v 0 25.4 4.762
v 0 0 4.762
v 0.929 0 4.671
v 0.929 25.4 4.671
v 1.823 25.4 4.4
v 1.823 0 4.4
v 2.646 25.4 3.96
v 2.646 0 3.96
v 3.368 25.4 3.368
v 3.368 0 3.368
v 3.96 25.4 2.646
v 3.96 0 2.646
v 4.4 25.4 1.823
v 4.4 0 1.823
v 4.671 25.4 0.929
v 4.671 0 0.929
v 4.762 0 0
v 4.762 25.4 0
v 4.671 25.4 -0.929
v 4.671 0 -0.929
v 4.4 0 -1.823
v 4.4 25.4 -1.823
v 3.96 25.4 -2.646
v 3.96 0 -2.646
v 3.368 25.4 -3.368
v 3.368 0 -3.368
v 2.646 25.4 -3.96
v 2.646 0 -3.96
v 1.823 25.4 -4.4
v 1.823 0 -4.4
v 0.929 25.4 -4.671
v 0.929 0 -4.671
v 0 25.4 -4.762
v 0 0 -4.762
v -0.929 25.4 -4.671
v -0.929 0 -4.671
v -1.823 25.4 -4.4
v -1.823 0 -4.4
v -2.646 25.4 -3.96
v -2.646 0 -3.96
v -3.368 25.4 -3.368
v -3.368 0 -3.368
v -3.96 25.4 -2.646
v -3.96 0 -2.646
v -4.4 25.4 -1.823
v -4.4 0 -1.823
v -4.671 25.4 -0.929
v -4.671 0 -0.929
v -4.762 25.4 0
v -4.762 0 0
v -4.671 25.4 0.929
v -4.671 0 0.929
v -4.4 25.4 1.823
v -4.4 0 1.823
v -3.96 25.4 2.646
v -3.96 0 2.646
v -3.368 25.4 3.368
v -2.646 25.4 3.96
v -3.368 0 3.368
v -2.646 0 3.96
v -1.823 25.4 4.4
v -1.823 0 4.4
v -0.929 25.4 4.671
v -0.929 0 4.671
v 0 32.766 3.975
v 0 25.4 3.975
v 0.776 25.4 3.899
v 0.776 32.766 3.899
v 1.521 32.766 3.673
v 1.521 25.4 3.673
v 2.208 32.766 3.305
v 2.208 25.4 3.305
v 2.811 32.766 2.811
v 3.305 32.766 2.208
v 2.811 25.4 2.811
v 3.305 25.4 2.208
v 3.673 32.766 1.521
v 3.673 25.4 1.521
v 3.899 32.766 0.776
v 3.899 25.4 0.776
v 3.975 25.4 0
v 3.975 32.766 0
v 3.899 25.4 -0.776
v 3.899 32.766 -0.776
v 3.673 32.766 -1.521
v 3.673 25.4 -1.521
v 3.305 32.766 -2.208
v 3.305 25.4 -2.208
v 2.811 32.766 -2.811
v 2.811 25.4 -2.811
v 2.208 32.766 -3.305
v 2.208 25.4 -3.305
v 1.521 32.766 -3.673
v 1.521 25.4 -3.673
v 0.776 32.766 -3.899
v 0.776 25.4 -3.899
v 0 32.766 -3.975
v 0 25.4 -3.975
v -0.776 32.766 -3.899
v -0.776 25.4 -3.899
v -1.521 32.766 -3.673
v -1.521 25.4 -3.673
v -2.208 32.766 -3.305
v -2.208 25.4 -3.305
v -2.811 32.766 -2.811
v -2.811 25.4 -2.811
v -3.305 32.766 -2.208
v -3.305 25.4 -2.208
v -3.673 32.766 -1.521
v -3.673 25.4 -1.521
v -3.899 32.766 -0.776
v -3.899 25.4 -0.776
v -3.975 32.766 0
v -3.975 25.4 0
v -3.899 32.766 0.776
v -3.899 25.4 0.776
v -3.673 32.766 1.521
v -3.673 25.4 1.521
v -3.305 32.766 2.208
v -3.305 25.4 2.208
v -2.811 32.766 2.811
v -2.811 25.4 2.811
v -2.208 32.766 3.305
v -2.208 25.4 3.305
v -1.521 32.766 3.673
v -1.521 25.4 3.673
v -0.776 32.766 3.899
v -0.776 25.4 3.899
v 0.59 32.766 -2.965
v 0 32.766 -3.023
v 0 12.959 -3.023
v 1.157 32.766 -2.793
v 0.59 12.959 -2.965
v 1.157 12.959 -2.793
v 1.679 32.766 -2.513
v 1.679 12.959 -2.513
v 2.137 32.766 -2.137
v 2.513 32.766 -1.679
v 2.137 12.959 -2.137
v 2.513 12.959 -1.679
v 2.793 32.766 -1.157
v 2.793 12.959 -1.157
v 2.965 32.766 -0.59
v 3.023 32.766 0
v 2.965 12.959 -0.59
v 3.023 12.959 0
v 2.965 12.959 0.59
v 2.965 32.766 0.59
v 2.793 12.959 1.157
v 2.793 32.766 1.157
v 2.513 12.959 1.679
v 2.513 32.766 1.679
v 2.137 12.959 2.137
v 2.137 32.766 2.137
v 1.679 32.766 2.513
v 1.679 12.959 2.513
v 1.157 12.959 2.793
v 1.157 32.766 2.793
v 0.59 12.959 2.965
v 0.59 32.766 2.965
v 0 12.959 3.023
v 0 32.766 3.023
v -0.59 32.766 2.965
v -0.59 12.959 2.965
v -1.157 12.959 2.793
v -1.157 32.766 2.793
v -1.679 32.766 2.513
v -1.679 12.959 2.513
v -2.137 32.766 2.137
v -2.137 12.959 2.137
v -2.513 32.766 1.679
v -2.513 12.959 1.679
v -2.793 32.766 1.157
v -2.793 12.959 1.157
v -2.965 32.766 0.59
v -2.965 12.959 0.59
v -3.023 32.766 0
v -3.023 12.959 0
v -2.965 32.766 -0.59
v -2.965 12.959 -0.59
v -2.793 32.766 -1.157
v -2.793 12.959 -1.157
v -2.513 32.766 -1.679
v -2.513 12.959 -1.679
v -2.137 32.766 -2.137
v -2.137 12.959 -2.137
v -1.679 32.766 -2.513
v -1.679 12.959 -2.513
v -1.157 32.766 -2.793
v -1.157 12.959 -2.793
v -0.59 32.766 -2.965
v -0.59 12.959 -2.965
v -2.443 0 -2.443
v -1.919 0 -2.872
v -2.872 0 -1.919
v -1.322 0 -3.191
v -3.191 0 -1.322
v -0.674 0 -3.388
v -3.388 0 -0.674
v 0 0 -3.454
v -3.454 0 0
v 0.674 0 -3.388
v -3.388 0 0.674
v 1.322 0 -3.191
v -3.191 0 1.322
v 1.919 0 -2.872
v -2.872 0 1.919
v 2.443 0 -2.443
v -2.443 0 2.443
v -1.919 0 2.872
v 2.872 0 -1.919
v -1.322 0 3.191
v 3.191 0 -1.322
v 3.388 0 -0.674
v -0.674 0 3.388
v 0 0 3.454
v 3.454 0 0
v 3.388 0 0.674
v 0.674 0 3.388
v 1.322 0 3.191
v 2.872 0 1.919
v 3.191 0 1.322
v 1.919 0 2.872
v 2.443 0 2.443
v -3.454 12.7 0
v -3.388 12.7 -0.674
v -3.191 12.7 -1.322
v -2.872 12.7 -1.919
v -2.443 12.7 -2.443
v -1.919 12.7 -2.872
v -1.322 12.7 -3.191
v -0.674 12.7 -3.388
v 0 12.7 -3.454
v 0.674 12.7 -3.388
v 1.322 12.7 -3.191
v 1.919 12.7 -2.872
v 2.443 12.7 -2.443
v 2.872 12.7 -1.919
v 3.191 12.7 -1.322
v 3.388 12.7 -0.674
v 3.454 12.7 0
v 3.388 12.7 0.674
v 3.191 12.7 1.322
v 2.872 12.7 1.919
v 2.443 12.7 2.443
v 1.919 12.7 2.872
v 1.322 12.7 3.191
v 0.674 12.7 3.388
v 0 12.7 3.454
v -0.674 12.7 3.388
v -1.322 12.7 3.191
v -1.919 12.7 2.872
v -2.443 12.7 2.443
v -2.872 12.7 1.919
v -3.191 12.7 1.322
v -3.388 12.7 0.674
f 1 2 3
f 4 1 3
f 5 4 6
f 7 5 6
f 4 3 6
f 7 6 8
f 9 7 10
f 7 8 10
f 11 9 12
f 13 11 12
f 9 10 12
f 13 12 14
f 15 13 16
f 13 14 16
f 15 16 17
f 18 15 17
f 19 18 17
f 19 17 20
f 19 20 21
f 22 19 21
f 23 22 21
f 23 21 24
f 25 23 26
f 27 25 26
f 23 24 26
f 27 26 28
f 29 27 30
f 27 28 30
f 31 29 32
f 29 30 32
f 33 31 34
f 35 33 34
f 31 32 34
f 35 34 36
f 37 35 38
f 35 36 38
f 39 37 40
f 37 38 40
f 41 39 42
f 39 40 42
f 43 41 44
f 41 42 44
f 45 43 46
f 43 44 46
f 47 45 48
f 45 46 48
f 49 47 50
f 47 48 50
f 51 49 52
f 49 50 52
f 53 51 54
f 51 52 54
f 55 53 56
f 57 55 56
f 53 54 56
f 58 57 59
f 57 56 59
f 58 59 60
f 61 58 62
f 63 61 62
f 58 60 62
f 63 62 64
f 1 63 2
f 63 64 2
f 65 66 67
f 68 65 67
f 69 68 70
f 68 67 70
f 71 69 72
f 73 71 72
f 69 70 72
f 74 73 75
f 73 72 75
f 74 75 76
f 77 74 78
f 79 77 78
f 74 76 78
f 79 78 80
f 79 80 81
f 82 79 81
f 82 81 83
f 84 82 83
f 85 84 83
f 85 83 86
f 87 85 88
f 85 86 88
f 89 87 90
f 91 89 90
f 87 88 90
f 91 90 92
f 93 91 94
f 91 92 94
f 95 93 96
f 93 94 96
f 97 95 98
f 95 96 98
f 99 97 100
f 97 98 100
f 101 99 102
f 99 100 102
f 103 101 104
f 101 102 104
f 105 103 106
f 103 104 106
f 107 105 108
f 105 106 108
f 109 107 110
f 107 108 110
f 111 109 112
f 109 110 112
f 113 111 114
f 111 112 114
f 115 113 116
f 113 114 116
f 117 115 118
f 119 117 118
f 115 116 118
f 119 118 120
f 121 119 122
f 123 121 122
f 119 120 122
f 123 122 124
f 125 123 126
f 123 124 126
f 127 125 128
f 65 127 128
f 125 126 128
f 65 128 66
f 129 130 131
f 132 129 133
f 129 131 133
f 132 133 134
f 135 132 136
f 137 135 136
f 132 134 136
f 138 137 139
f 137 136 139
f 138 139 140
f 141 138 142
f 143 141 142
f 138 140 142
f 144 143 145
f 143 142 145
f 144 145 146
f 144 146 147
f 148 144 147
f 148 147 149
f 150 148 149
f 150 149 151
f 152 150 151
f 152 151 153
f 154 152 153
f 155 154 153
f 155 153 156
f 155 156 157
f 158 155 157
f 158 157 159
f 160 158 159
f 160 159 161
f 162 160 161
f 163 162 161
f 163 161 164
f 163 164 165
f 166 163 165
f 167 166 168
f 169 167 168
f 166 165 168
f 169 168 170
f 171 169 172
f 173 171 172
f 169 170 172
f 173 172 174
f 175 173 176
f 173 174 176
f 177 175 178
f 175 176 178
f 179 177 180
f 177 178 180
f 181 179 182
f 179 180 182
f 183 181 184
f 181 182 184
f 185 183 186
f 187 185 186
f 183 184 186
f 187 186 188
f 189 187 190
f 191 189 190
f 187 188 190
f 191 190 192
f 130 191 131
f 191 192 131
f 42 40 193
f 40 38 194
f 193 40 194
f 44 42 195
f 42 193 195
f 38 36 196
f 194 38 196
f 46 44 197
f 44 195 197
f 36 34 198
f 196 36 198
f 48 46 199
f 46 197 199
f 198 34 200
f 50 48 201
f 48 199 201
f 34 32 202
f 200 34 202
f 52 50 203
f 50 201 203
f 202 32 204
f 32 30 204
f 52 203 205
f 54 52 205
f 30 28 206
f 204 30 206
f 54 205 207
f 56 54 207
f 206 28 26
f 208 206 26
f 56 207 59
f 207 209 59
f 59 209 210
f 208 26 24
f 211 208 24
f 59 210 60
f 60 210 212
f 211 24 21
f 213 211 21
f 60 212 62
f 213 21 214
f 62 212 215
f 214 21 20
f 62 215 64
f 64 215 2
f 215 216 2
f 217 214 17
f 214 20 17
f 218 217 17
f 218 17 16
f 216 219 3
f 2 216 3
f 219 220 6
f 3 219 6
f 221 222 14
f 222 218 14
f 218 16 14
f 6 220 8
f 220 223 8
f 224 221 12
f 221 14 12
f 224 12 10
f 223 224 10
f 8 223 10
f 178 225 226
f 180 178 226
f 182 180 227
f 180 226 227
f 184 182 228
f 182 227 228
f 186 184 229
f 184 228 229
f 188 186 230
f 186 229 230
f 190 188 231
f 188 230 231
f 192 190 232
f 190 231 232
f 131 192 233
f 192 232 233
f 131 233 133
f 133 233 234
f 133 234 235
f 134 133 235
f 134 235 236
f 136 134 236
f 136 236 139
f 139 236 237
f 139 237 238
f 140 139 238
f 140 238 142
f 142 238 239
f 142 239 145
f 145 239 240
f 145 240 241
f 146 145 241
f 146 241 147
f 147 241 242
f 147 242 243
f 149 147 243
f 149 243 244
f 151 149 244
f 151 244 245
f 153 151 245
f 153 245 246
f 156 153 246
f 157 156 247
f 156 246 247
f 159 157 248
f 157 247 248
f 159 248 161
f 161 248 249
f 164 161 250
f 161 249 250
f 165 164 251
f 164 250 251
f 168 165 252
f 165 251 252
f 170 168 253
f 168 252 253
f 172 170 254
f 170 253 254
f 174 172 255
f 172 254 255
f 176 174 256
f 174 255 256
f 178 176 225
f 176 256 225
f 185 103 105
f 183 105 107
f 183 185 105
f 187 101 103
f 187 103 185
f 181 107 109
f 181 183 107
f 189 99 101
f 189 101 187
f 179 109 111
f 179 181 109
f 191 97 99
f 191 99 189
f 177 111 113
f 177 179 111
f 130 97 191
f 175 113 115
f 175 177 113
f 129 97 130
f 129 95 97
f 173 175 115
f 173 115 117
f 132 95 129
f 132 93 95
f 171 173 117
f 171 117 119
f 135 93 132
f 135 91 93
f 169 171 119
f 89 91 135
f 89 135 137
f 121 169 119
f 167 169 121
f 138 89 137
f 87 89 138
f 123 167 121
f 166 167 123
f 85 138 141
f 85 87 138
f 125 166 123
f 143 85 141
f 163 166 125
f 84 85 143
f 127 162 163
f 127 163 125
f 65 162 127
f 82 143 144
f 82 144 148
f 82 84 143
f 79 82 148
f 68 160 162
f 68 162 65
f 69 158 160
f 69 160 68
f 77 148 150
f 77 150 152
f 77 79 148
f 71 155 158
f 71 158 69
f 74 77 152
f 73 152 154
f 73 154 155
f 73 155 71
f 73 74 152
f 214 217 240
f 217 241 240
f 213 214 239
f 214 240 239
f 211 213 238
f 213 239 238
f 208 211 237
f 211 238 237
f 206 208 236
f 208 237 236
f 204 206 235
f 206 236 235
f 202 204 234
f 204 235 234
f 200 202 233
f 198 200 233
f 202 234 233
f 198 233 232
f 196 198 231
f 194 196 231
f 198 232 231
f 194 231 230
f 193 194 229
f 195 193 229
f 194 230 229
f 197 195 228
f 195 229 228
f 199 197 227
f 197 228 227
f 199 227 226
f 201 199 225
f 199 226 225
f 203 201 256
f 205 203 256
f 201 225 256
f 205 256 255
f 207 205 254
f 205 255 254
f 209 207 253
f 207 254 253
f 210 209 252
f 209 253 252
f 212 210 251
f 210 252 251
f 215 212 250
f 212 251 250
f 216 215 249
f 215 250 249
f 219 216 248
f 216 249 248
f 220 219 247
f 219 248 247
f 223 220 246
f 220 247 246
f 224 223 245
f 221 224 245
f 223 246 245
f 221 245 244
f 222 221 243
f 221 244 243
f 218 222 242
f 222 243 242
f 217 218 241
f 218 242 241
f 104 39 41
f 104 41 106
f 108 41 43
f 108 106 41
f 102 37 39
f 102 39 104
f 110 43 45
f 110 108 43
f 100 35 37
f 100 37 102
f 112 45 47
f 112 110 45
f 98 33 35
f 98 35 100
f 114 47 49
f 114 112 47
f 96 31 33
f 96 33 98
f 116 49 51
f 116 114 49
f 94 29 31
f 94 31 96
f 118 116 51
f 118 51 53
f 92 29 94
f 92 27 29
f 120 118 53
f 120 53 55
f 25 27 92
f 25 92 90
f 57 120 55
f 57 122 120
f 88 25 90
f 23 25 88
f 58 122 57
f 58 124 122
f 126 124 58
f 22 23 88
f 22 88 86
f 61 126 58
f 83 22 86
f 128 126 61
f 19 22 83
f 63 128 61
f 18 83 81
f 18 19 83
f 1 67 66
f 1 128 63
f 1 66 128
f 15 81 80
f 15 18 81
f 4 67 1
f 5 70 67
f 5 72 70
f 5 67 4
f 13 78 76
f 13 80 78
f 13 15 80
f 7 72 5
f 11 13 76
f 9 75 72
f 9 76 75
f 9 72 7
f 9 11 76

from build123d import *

# Parameters (mm, degrees)
SKETCH1_R                    = 4.7625
BOSS_EXTRUDE1_DEPTH          = 25.4
SKETCH2_R                    = 3.9751
BOSS_EXTRUDE2_DEPTH          = 7.366
SKETCH3_R                    = 3.0226
CUT_EXTRUDE1_DEPTH           = 33.766
F_5_16_24_TAPPED_HOLE1_D     = 6.9088
F_5_16_24_TAPPED_HOLE1_DEPTH = 12.7
F_5_16_24_TAPPED_HOLE1_TIP   = 2.075612922


with BuildPart() as part:
    # Sketch1 → Boss-Extrude1 (new body)
    with BuildSketch(Plane(origin=(0, 0, 0), x_dir=(1, 0, 0), z_dir=(0, 1, 0))):
        with Locations(Location((0, 0, 0), (0, 0, 270))):  # turned: the seam where the file's is
            Circle(SKETCH1_R)
    extrude(amount=BOSS_EXTRUDE1_DEPTH)

    # Sketch2 → Boss-Extrude2 (add)
    with BuildSketch(Plane(origin=(0, 25.4, 0), x_dir=(1, 0, 0), z_dir=(0, 1, 0))):
        with Locations(Location((0, 0, 0), (0, 0, 270))):  # turned: the seam where the file's is
            Circle(SKETCH2_R)
    extrude(amount=BOSS_EXTRUDE2_DEPTH)

    # Sketch3 → Cut-Extrude1 (cut, through all)
    with BuildSketch(Plane.XZ):
        with Locations(Location((0, 0, 0), (0, 0, 270))):  # turned: the seam where the file's is
            Circle(SKETCH3_R)
    extrude(amount=-CUT_EXTRUDE1_DEPTH, mode=Mode.SUBTRACT)

    # 5/16-24 Tapped Hole1
    with Locations(Plane(origin=(0, 0, 0), x_dir=(-1, 0, 0), z_dir=(0, -1, 0))):
        with Locations((0, 0)):
            Hole(F_5_16_24_TAPPED_HOLE1_D / 2, depth=F_5_16_24_TAPPED_HOLE1_DEPTH)
            with Locations((0, 0, -(F_5_16_24_TAPPED_HOLE1_DEPTH + F_5_16_24_TAPPED_HOLE1_TIP / 2))):  # 118° drill point
                Cone(0, F_5_16_24_TAPPED_HOLE1_D / 2, F_5_16_24_TAPPED_HOLE1_TIP, mode=Mode.SUBTRACT)


solid = part.part
